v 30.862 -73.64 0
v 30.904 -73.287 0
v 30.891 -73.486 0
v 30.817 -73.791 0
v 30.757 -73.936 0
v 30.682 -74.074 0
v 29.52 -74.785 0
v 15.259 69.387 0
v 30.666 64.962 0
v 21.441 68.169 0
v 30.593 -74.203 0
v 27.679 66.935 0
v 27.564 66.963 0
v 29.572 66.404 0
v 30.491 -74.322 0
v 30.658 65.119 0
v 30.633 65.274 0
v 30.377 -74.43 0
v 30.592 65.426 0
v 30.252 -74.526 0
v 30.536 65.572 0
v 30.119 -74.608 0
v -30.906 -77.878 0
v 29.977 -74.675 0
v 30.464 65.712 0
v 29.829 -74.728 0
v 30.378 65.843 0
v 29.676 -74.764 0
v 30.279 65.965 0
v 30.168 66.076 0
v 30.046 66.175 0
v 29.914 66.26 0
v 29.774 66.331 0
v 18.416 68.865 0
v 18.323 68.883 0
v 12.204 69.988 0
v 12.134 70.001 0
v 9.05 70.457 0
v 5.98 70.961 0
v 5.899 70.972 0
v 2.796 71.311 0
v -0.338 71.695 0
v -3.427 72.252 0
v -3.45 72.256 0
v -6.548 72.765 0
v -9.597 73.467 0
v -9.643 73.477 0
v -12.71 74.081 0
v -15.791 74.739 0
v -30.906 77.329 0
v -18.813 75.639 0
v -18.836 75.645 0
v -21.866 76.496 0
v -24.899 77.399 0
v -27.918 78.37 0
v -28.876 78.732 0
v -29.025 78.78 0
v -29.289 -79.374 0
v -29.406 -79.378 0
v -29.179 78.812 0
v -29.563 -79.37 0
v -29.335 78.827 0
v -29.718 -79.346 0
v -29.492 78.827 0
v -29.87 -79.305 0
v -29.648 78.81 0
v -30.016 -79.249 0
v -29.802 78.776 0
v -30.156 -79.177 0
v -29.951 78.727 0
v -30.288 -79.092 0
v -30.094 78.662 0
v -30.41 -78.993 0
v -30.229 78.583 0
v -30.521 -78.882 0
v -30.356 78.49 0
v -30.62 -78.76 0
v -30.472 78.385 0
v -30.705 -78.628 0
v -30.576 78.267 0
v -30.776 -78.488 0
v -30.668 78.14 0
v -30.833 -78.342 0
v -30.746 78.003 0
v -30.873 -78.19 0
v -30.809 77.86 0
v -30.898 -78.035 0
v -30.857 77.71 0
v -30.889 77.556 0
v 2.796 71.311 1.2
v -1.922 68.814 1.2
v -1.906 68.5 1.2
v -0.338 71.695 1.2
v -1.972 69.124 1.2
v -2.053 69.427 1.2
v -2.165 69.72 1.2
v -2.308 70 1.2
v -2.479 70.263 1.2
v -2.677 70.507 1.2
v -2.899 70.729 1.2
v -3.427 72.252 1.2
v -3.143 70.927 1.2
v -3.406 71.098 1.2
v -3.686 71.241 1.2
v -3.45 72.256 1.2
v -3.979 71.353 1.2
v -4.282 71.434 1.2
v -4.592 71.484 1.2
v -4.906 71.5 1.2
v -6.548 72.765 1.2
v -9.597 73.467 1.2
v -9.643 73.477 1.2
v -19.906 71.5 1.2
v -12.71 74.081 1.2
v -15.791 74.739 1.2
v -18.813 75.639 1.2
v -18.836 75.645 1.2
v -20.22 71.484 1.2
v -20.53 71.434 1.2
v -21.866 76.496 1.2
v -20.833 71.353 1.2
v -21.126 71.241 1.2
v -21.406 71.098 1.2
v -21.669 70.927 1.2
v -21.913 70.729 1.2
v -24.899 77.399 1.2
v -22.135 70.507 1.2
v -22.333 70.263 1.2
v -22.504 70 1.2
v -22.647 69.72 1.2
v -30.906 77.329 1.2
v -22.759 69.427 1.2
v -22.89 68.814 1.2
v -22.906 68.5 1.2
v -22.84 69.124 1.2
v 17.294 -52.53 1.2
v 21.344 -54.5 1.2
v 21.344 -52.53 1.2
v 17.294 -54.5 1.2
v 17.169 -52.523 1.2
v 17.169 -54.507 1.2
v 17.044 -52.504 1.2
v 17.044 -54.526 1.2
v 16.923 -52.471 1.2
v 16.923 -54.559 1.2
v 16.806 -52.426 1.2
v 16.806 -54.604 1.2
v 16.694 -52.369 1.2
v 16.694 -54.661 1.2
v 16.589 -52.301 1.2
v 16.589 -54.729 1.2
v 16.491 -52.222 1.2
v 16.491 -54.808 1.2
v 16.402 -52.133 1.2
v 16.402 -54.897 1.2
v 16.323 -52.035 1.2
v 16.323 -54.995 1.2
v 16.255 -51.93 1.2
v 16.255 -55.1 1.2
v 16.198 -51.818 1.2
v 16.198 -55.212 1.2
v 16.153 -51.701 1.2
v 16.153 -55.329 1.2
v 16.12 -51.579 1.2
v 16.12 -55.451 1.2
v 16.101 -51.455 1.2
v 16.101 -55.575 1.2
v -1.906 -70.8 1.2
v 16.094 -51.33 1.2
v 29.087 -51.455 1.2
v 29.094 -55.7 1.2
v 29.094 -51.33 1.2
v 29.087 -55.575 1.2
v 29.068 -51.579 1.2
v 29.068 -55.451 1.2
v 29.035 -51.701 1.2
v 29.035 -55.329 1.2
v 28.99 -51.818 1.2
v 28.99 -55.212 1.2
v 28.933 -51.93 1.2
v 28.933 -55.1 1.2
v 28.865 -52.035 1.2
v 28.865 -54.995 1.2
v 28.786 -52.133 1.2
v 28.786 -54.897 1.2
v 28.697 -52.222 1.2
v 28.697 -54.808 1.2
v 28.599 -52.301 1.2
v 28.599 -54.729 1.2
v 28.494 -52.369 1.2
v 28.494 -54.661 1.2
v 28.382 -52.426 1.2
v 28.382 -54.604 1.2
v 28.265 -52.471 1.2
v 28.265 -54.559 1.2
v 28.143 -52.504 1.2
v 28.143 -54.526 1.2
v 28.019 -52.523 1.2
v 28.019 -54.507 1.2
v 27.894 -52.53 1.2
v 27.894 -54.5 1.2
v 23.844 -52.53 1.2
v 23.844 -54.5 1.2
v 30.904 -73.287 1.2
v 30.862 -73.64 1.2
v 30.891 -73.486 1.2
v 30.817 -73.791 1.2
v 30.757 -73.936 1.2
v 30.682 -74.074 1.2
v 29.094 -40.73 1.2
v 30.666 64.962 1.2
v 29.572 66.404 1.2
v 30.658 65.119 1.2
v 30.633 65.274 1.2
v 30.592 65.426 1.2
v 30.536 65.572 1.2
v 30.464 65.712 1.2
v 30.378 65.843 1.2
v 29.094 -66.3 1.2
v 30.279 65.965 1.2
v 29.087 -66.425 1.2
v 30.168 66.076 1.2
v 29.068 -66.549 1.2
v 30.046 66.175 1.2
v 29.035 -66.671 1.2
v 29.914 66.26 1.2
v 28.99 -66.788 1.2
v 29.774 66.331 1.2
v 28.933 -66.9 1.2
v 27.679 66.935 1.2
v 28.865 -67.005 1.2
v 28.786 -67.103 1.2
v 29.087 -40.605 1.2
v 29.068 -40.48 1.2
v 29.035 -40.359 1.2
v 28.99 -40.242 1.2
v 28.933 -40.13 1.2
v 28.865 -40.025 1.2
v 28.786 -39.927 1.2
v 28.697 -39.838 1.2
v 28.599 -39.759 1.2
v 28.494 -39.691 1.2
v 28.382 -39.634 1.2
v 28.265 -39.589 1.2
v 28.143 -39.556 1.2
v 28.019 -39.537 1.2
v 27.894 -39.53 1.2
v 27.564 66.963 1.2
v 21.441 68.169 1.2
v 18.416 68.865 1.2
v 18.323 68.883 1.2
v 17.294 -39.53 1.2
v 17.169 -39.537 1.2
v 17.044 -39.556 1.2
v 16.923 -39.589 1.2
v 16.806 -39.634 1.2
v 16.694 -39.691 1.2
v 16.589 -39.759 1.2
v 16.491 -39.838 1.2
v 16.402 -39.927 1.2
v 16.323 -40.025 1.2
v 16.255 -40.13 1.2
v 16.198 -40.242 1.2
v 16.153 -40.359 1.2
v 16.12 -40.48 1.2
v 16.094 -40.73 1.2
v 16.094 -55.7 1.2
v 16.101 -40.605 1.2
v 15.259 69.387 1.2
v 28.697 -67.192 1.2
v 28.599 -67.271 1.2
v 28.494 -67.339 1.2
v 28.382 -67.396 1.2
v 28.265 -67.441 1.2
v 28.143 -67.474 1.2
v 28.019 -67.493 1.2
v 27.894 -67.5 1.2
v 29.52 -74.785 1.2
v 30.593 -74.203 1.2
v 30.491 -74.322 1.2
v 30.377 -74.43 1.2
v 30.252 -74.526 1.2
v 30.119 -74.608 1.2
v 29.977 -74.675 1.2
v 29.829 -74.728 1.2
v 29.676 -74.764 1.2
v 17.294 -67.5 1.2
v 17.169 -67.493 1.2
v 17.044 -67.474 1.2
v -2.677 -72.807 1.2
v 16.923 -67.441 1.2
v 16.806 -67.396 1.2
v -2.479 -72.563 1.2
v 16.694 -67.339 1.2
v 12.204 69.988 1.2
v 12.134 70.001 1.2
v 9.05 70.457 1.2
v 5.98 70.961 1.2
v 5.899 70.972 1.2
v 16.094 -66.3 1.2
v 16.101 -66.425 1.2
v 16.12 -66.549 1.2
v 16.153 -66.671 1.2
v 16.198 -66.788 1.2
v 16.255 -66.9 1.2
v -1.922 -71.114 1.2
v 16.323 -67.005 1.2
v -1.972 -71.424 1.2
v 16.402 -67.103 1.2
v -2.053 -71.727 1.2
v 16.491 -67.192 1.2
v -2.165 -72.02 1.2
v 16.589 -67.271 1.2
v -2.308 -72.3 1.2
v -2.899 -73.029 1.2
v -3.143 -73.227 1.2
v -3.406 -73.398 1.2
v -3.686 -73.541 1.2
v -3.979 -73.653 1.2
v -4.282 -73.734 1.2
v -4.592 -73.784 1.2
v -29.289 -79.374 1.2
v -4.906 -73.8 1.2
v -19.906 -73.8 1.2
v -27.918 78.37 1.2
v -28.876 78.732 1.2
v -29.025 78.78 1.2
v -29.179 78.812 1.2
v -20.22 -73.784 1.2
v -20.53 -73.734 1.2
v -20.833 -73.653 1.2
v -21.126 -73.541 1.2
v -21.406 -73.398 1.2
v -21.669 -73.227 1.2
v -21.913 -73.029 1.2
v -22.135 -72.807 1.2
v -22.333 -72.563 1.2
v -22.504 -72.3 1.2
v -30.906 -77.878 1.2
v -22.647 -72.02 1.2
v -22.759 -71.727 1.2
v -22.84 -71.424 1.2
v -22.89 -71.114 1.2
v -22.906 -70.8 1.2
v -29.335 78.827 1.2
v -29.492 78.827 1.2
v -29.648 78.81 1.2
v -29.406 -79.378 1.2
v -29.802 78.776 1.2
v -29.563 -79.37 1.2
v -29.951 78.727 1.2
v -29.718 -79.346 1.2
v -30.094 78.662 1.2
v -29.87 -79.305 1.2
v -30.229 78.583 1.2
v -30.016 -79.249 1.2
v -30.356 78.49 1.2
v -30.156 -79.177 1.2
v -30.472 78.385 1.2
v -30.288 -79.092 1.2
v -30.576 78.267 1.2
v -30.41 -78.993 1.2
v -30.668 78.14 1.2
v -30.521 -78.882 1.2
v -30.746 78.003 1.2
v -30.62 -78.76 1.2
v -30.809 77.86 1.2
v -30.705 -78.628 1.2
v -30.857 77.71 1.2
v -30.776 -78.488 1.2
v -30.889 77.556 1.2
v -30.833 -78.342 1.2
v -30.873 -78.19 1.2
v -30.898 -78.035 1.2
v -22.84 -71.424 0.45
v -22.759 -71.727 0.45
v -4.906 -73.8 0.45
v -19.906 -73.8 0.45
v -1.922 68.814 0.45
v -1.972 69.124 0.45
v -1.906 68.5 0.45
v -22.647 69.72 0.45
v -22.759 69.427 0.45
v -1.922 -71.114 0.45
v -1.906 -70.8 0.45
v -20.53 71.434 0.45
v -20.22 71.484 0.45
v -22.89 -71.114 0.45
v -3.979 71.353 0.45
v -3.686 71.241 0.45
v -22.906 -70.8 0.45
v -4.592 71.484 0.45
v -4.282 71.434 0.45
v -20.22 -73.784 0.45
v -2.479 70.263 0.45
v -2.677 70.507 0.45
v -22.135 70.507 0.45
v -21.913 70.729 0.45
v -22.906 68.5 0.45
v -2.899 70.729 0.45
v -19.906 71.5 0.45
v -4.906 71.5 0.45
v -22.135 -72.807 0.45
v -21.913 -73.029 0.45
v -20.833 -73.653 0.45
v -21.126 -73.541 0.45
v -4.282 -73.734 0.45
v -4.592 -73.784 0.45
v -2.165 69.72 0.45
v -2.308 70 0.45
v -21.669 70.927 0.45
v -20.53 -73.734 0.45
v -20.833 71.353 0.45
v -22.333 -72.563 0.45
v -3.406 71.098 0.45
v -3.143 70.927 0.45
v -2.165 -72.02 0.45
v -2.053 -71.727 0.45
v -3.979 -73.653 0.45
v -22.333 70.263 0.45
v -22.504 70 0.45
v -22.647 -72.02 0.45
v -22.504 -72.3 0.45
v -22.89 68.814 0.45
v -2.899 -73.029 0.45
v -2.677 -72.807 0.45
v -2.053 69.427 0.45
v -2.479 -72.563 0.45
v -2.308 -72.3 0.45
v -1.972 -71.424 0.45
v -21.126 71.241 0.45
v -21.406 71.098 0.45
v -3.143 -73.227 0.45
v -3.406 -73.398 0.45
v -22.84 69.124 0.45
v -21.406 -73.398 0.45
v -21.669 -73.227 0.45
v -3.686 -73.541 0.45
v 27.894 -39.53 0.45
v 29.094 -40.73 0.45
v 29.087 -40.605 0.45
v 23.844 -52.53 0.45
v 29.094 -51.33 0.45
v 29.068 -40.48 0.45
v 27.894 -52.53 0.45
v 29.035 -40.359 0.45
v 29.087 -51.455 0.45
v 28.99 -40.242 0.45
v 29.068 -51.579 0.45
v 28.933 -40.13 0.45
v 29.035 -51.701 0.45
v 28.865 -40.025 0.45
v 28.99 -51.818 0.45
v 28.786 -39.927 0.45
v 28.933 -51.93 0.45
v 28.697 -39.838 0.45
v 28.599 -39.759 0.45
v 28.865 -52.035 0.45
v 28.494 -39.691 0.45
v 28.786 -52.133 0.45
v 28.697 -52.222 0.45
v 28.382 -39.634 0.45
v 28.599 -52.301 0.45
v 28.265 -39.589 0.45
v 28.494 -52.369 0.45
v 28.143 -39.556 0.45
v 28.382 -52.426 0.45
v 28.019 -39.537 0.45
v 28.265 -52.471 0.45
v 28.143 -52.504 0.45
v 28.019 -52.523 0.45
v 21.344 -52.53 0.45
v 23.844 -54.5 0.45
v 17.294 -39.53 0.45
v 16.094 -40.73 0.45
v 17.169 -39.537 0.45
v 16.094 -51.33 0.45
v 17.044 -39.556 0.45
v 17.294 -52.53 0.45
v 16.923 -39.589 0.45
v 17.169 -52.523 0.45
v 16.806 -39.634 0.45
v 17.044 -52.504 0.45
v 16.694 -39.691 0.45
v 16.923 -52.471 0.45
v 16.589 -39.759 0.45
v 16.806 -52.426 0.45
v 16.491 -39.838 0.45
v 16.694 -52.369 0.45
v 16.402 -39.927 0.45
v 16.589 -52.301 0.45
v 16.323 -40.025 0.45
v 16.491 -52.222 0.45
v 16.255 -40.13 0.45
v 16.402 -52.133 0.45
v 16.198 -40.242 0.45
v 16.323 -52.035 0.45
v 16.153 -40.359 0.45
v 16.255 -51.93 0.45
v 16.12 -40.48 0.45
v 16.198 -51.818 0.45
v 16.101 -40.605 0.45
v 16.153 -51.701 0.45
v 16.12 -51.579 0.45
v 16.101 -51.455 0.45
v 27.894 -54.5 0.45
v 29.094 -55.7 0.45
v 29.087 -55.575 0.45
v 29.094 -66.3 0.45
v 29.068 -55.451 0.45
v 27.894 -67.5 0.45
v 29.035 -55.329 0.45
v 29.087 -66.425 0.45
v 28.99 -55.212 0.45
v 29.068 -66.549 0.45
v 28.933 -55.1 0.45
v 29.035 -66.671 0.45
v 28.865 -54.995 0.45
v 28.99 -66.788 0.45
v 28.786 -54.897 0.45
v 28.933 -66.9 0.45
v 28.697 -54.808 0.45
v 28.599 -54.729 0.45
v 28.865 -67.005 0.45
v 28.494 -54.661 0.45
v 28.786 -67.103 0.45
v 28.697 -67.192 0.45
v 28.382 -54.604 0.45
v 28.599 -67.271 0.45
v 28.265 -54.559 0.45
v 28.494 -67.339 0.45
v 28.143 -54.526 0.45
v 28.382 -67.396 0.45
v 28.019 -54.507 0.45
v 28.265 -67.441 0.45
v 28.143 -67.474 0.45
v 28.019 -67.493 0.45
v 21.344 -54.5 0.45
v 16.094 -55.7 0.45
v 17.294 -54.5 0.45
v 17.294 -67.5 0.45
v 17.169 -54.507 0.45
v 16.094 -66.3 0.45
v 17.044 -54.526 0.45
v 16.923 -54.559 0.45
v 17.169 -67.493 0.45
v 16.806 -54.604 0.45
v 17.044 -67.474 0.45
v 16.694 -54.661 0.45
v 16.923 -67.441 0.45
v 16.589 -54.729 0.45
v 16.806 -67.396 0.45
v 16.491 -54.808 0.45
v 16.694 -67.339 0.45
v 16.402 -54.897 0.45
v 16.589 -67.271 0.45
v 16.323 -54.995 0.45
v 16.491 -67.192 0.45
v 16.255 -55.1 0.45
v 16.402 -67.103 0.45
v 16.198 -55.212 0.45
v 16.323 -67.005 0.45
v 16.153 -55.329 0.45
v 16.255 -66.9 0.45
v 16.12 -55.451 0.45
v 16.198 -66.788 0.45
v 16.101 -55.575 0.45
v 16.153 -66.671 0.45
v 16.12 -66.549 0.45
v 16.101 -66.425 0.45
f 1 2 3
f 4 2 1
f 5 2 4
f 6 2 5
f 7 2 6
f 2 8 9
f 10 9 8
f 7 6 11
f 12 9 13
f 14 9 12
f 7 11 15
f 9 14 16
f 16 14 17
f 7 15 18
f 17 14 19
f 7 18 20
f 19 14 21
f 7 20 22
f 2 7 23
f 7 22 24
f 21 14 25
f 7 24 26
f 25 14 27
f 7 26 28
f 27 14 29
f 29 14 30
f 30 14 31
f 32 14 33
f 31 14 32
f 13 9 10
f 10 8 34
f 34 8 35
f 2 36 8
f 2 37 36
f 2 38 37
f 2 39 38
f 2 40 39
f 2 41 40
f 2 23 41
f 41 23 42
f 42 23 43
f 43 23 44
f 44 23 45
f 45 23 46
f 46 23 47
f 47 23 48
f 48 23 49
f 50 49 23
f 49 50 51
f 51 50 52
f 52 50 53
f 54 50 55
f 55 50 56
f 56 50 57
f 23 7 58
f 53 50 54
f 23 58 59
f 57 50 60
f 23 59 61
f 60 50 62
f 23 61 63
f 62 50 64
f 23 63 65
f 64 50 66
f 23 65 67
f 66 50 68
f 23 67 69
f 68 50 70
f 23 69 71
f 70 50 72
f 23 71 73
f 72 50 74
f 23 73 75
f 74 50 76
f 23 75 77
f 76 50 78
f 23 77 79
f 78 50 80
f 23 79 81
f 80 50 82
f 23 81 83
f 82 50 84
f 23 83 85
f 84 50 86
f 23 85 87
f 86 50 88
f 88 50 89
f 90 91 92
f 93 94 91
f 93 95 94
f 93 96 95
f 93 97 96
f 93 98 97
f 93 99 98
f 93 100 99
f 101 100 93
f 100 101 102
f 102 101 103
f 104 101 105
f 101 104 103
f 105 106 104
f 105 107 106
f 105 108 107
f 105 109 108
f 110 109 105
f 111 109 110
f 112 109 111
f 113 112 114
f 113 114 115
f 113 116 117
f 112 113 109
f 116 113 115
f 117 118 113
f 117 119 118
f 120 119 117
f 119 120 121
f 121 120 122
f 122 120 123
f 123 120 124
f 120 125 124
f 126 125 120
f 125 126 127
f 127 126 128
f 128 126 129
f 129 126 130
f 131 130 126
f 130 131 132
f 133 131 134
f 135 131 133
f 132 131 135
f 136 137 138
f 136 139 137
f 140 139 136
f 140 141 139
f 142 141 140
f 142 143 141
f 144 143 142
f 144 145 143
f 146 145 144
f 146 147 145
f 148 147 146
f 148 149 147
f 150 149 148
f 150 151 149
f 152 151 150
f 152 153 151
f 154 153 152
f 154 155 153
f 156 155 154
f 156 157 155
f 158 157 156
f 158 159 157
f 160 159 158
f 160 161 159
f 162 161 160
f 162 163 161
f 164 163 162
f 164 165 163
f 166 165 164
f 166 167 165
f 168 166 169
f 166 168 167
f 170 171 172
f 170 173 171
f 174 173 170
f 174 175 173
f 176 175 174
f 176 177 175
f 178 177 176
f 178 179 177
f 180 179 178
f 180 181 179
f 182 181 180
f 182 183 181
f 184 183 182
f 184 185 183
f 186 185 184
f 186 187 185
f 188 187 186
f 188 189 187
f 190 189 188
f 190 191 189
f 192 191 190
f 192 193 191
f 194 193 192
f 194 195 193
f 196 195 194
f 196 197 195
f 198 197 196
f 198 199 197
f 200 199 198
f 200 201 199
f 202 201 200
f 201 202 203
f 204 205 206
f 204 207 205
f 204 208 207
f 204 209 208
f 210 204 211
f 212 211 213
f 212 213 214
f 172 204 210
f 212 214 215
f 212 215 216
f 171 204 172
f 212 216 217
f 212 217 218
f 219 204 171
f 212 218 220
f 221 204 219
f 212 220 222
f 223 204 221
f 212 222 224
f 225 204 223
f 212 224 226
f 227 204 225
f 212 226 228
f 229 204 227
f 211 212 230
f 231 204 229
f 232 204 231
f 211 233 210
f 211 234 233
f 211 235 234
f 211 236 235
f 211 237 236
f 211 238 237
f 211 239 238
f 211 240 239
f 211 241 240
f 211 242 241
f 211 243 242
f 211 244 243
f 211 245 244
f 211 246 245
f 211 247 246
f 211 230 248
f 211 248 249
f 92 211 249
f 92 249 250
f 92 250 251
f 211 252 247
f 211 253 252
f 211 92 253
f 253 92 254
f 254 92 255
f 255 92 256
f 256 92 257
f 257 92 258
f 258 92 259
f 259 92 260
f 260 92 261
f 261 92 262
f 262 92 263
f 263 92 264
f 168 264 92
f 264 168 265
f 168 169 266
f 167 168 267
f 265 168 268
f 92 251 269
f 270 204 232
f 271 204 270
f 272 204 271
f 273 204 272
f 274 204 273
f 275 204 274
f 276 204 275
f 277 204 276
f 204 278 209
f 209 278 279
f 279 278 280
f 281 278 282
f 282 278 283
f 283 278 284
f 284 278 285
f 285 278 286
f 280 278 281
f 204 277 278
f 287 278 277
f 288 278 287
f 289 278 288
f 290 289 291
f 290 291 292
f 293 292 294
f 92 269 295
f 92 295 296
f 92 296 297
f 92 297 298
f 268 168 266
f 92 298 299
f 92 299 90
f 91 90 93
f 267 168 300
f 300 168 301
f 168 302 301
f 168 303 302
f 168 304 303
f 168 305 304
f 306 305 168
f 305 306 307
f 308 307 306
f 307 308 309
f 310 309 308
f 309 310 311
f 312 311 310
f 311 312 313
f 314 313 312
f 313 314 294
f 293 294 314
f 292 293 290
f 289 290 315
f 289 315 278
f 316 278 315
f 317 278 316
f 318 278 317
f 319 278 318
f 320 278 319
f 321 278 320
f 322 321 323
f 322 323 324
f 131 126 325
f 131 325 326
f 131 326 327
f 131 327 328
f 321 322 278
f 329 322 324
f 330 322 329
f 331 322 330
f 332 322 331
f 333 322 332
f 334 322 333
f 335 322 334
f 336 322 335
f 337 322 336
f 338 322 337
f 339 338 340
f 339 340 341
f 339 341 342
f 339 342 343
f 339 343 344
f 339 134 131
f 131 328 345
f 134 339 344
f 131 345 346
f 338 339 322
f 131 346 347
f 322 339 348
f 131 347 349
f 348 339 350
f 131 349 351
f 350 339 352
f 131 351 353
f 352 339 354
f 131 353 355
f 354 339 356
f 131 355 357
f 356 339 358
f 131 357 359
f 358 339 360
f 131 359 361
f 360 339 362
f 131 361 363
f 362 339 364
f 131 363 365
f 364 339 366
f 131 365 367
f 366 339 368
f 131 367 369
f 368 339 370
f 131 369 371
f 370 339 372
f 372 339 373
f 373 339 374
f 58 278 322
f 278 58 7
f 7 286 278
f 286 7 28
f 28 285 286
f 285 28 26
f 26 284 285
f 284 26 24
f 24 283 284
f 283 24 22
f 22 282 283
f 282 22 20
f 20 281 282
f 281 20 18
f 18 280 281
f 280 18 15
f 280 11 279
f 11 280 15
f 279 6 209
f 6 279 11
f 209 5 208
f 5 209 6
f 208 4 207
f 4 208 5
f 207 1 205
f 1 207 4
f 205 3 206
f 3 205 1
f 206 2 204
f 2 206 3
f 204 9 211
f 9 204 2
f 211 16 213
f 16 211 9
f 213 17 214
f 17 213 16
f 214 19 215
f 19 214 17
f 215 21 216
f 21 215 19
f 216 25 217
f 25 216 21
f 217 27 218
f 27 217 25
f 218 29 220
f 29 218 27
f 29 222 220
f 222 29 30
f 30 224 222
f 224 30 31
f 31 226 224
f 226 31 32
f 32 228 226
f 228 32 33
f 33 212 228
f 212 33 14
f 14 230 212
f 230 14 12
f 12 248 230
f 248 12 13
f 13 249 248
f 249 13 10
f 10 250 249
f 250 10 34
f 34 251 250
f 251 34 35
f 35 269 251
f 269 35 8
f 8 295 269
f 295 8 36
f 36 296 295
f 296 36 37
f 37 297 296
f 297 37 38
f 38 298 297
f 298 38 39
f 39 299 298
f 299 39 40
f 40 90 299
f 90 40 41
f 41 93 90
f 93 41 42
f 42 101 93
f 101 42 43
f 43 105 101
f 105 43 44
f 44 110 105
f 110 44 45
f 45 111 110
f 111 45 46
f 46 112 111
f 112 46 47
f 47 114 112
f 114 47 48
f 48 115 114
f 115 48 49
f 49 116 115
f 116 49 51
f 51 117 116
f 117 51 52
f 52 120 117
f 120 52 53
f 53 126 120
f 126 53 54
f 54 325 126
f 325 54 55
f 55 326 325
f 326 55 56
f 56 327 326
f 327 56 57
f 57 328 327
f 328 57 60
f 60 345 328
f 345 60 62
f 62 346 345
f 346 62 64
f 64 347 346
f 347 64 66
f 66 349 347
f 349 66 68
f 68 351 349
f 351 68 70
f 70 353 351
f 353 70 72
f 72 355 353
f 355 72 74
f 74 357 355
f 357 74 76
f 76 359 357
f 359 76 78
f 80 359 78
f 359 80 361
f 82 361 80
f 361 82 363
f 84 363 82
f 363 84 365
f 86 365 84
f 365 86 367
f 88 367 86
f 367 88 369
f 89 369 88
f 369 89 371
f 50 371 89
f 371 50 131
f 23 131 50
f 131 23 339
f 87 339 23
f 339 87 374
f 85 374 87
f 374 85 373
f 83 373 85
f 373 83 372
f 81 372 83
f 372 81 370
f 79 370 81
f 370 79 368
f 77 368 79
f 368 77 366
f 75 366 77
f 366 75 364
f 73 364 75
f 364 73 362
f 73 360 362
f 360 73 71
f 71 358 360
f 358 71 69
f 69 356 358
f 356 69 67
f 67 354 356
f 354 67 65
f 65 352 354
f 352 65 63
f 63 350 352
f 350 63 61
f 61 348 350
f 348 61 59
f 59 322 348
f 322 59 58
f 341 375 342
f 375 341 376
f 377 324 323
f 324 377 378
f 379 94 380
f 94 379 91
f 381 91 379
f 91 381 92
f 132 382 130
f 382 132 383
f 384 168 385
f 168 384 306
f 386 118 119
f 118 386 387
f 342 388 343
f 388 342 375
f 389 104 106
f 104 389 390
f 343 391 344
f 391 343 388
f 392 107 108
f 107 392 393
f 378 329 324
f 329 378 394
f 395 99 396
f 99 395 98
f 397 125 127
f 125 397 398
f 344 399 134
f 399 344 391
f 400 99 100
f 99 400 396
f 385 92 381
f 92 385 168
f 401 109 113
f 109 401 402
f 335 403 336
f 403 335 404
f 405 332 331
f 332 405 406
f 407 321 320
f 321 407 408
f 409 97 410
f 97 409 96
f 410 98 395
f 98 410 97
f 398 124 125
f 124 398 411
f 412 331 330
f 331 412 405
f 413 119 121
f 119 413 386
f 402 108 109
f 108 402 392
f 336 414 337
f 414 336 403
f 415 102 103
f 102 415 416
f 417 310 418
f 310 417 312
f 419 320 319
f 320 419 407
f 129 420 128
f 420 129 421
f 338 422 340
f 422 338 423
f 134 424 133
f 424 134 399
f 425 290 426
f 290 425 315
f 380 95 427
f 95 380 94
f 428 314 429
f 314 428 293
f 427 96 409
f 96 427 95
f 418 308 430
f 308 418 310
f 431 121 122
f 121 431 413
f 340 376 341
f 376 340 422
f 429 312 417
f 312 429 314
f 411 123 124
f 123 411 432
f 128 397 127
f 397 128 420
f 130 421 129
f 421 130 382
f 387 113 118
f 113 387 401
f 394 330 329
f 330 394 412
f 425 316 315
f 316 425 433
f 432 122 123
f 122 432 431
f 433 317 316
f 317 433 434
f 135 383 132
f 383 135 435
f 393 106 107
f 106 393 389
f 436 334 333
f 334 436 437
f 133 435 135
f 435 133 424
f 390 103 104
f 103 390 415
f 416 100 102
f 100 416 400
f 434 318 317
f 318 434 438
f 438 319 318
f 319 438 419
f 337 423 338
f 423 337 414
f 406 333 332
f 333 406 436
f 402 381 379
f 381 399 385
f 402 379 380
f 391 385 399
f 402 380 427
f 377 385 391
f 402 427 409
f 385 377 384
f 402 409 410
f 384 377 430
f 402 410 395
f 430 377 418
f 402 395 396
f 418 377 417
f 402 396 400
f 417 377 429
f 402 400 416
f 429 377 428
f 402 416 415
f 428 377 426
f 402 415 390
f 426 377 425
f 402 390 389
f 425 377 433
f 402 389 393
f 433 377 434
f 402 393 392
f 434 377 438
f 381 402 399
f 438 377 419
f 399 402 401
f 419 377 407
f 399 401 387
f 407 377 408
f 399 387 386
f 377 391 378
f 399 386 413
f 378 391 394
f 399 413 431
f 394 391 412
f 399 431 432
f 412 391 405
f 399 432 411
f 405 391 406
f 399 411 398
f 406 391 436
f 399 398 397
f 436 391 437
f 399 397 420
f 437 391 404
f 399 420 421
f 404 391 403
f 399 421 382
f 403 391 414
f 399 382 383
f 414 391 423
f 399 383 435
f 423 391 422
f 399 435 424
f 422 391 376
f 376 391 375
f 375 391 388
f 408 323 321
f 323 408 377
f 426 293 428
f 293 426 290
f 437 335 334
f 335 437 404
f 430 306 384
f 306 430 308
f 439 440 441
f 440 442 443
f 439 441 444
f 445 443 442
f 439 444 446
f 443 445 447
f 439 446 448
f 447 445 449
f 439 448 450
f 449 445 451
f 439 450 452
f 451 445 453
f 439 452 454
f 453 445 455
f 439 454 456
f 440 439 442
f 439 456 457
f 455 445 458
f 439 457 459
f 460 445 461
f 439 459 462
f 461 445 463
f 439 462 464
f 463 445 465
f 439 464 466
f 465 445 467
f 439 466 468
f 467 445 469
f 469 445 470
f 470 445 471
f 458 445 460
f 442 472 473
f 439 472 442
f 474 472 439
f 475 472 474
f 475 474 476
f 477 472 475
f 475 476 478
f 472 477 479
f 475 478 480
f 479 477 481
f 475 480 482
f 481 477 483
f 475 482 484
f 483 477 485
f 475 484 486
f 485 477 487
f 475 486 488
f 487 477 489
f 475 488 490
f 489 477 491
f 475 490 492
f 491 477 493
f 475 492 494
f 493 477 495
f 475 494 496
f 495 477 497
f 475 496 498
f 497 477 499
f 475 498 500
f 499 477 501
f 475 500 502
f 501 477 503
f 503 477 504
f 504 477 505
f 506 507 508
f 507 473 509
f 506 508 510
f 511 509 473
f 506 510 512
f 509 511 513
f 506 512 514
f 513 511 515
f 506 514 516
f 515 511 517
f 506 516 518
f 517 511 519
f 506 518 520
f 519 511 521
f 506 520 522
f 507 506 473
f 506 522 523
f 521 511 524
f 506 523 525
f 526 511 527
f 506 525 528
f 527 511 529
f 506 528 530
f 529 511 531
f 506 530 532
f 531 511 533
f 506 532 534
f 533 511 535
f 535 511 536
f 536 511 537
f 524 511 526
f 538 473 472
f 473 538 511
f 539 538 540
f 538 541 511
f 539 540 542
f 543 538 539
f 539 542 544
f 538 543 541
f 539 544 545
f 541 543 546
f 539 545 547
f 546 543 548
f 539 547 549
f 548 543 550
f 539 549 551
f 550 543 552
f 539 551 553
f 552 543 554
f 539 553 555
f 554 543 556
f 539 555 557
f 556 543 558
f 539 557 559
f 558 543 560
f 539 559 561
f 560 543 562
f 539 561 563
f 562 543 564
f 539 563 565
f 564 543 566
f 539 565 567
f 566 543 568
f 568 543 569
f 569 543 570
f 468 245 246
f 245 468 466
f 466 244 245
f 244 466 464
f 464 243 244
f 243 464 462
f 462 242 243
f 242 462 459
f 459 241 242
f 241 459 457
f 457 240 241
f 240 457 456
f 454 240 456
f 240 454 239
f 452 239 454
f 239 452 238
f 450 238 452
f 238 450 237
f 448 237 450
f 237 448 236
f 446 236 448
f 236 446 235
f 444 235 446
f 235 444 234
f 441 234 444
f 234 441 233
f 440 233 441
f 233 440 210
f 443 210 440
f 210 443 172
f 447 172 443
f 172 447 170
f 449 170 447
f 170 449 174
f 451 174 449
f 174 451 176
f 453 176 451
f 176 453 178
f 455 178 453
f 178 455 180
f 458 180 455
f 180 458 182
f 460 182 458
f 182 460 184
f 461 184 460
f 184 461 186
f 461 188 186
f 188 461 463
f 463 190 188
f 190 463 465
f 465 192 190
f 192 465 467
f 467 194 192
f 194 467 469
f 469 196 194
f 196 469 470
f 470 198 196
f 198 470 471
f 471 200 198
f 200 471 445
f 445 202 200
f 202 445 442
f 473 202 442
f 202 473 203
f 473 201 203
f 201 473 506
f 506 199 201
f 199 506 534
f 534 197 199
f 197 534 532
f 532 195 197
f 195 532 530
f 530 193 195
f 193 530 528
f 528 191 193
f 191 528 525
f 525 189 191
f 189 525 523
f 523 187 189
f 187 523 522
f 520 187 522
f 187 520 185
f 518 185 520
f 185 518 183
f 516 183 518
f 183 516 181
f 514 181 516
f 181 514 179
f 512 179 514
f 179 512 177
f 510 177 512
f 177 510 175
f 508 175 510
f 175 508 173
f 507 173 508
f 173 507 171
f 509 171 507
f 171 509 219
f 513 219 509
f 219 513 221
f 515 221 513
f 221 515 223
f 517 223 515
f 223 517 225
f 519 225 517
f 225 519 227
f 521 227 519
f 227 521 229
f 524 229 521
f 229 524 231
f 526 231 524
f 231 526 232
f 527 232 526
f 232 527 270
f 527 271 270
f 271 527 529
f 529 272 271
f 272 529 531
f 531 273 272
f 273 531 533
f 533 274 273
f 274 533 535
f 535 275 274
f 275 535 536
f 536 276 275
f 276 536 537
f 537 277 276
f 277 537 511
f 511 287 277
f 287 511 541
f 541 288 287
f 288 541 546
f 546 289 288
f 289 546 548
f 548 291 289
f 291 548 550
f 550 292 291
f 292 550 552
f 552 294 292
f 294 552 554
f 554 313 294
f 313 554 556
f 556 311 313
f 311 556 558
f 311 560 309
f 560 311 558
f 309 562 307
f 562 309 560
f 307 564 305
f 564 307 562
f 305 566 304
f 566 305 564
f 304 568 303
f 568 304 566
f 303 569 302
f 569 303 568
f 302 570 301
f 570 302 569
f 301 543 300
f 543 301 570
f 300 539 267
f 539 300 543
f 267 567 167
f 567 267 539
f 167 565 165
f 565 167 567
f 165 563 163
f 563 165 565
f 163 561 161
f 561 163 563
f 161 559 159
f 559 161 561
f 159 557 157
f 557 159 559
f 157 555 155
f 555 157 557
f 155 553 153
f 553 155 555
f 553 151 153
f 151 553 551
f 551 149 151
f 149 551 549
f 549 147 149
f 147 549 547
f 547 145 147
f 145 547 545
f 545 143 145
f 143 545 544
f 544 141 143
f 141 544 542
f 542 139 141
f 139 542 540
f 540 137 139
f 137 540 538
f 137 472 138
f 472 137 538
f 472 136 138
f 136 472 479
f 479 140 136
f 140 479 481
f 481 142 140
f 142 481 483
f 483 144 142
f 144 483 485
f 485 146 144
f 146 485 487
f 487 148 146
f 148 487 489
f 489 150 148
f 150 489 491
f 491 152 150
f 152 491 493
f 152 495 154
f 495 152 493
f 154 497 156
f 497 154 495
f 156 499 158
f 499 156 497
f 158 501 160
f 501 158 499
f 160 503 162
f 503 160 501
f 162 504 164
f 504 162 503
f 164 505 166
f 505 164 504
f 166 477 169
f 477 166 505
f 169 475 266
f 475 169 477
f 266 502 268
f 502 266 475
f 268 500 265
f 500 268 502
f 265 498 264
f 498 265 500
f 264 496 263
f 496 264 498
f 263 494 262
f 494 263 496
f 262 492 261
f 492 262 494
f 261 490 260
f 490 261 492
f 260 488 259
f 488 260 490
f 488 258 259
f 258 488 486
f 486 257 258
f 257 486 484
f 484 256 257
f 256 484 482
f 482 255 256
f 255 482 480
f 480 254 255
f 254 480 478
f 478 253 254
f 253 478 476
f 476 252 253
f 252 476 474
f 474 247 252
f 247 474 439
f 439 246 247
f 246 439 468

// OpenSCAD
// ============================================================
// Omnichord OM-27 Strumplate Top Plate
// ============================================================
// A cover plate that sits over the flex PCB strum strip.
// Two features create the gap needed between the flex PCB
// contacts and the conductive strumming surface:
//
//   1. MAIN VALLEY  -> a shallow recess: a slim rectangle with small
//      rounded corners at the short ends (NOT a fat pill/stadium),
//      running nearly the FULL length of the plate, independent of
//      where the pad cluster sits, cut to recess_depth.
//   2. PAD RECESS   -> a shallow pocket (same recess_depth) over the
//      small contact pad near the top, connected to a second
//      smaller pocket by a thin bridge slot (matches the two
//      cutouts + connecting tab seen in the reference CAD model).
//
// Both recesses are cut from the TOP face only, leaving a thin,
// paper-thin BOTTOM skin (bottom_skin_thickness) untouched -- that
// skin is the side the user's finger touches, and should be printed
// face-down on the bed as the first layer for max smoothness.
//
// Adjust the PARAMETERS block below to match your real
// measurements -- nothing else needs to change.
// ============================================================

/* [Overall plate -- asymmetric trapezoid with a curved top edge] */
// The two LONG edges (left & right) are PARALLEL to each other and are
// the sides the long valley recess runs alongside. The two SHORT edges
// (top & bottom) connect them and are NOT parallel to each other.
// The TOP short edge (opposite the pad cluster, which is mirrored to
// sit near the bottom in the 3D assembly below) is not straight.
edge_left_long   = 159;  // length of the long left edge, mm
edge_right_long  = 142;  // length of the long right edge, mm
edge_top_short   = 63;   // length of the short top edge, mm (straight-line/chord distance
                          // between TL and TR -- the curve deviates from this)
edge_bottom_short = 62;  // length of the short bottom edge, mm (straight)
corner_radius     = 1.5; // small rounding at all four corners (just enough to not be knife-sharp)

// --- Top edge curve: direct, editable point list ---
// Each entry is [t, dev]:
//   t   = position along the TL->TR chord, 0 = TL, 1 = TR
//   dev = perpendicular deviation from the straight chord, in mm
//         (POSITIVE = bulges OUT away from the plate body, NEGATIVE = dips IN)
// The curve is built by linearly interpolating between these points in
// order, so each point's effect is LOCAL -- nudge one [t, dev] pair and
// only the curve segments touching it move, unlike a Bezier where every
// control point affects the whole shape. Add more points for finer
// control anywhere you need it; t doesn't need to be evenly spaced.
// The first point should be [0, 0] (note: this curve doesn't return to
// 0 at t=1 -- it settles at -0.75, which is fine, just means TR sits
// slightly inset from the literal corner; t=1 is still anchored to TR
// in the construction below regardless of the dev value there).
// These points follow your last set (the ones that got close), just
// resampled to a finer 0.05 step using smooth monotone interpolation
// (PCHIP -- passes through your original points exactly, no
// overshoot/ringing introduced in between) so you have more individual
// handles to nudge.
TOP_CURVE_PTS = [
    [0.00, 0.0],
    [0.05, -0.531],
    [0.10, -0.9],
    [0.15, -1.2],
    [0.20, -1.45],
    [0.25, -1.75],
    [0.30, -1.8],
    [0.35, -1.8],
    [0.40, -1.9],
    [0.45, -1.8],
    [0.50, -1.75],
    [0.55, -1.521],
    [0.60, -1.25],
    [0.65, -1.15],
    [0.70, -1],
    [0.75, -1],
    [0.80, -0.9],
    [0.85, -1],
    [0.90, -1],
    [0.95, -1],
    [1.00, -1.25],
];
top_curve_resolution = 6; // segments to interpolate BETWEEN each pair of points
                          // (higher = smoother straight-line approximation of
                          // whatever shape you build with the points above;
                          // since interpolation is linear, this mostly just
                          // affects corner_radius rounding smoothness, not
                          // the underlying shape)

// --- Derived corner geometry (do not edit) ---
// Solve for the perpendicular distance `plate_w` between the two parallel
// long edges, and the vertical stagger `edge_offset` of the right edge
// relative to the left edge, such that the connecting short edges come
// out to edge_top_short / edge_bottom_short exactly (using the straight-
// line/chord length for the top edge, since the S-curve is added after).
// System (derived once and baked in as a closed-form solution):
//   bottom_short^2 = plate_w^2 + edge_offset^2
//   top_short^2    = plate_w^2 + (edge_left_long - (edge_offset + edge_right_long))^2
// Subtracting and solving for edge_offset:
_k = edge_left_long - edge_right_long;
edge_offset = ( (edge_bottom_short*edge_bottom_short) - (edge_top_short*edge_top_short) + (_k*_k) ) / (2*_k);
plate_w = sqrt(edge_bottom_short*edge_bottom_short - edge_offset*edge_offset);

// Corner coordinates (left edge along x=0, right edge along x=plate_w),
// then re-centered so x=0 sits on the long-axis centerline and y=0 sits
// at the vertical midpoint of the left edge, for convenient downstream use.
_BL = [0, 0];
_TL = [0, edge_left_long];
_BR = [plate_w, edge_offset];
_TR = [plate_w, edge_offset + edge_right_long];
_cx = plate_w/2;
_cy = edge_left_long/2;
BL = _BL - [_cx, _cy];
TL = _TL - [_cx, _cy];
BR = _BR - [_cx, _cy];
TR = _TR - [_cx, _cy];

// plate_length kept for backward compatibility with valley/pad placement
// below -- approximate overall span used for "distance from top" offsets.
plate_length = max(TL.y, TR.y) - min(BL.y, BR.y);

// The plate is built from two thicknesses stacked:
//   bottom_skin_thickness -> the touch surface (prints FIRST, face-down on the bed).
//                            Keep this paper-thin (1-2 perimeter layers, e.g. 0.2-0.4mm
//                            at a 0.2mm layer height) so finger contact can reach through
//                            wherever the recess above it is cut.
//   recess_depth           -> how deep the valley/pad recesses cut into the TOP face.
// plate_thickness is just their sum -- change the two thickness values, not this one.
bottom_skin_thickness = 0.45;   // <-- paper-thin touch surface, tune to your layer height
recess_depth          = 0.75;   // depth of the valley + pad recesses, cut from the top
plate_thickness        = bottom_skin_thickness + recess_depth;

/* [Main valley - shallow recess, sized to the OM-84 flex PCB contact row] */
// Measured from the OM-84 strumplate_traces.svg: 13 contacts, pitch
// 11.275mm center-to-center, each contact finger 13.698mm long (the
// across-strip dimension) x 4.421mm wide (the along-strip dimension).
contact_pitch       = 11.275; // mm, center-to-center spacing along the strip
contact_count       = 13;     // number of contacts in the row
valley_width      = 21;   // matches the OM-84 contact finger length (across-strip)
valley_length     = contact_pitch * (contact_count - 1) + 10; // total span of the row, ~139.7mm
valley_margin_top    = 8;  // gap kept between the top-left corner and the start of the valley
                             // (only used to help VERTICALLY CENTER the now fixed-length valley;
                             // see valley_2d() below)
valley_inset      = valley_width/2+8;    // how far in from the LEFT edge the recess sits, mm
valley_end_radius = 3;    // corner rounding radius at the two short ends (small radius,
                           // NOT half the width -- gives slim rounded-rect ends like the
                           // metallic strip in the reference photo, not a full pill cap)

/* [Pad recess cluster - sized to the OM-84 flex PCB pad contacts] */
// Measured from the same SVG: pad pitch 14.97mm center-to-center.
pad_contact_pitch = 14.97;  // mm, center-to-center spacing between the two pads
pad1_w = 13; pad1_h = 13;   // upper pad rectangle (rounded)
pad2_w = 13; pad2_h = 13;   // lower pad rectangle (rounded)
pad_corner_r       = 1.2;   // corner rounding for the pad rectangles
pad_gap            = pad_contact_pitch - pad1_h/2 - pad2_h/2; // vertical gap between pad1/pad2, derived from pitch
tab_width          = 2.5;   // width of the connecting bridge slot between pad1/pad2
min_wall_to_valley = 4;     // (unused now that spacing is set directly by distance below;
                             // kept only for reference/back-compat)
pad_to_valley_center_dist = 35; // distance between pad-cluster center and valley center, mm

// Final layout: the VALLEY sits on the NEGATIVE X side (toward the
// left edge) and stays exactly where it was. The PAD CLUSTER's center
// is placed exactly pad_to_valley_center_dist (35mm) away from the
// valley's center, along X.
pad_cluster_half_w = max(pad1_w, pad2_w) / 2;
valley_x_center = BL.x + valley_inset;
pad_offset_x = valley_x_center + pad_to_valley_center_dist;
pad_offset_y_top = TL.y - 25 + 13;   // y position where pad1 (upper) starts, measured down from top-left corner

/* [Rendering] */
$fn = 60;

// ============================================================
// 2D PROFILES
// ============================================================

// Asymmetric trapezoid plate outline: long left edge and long right
// edge are parallel; short bottom edge is straight; short TOP edge
// follows TOP_CURVE_PTS (see PARAMETERS above), projected onto the
// real TL-TR chord and linearly interpolated point-to-point, built
// from the solved corner points BL/TL/BR/TR, with small corner
// rounding applied at the end.
module plate_solid_2d() {
    chord = TR - TL;
    chord_len = norm(chord);
    u = chord / chord_len;
    perp = [u.y, -u.x];
    plate_center_dir = ((BL + BR) / 2) - (TL + TR) / 2;
    // outward_dir points AWAY from the plate body (so + dev bulges out)
    outward_dir = (perp.x*plate_center_dir.x + perp.y*plate_center_dir.y > 0) ? -perp : perp;

    // project each [t, dev] point onto the real chord
    anchor_pts = [
        for (pair = TOP_CURVE_PTS)
            TL + pair[0]*chord + outward_dir*pair[1]
    ];

    // linearly interpolate top_curve_resolution extra points between each
    // consecutive pair of anchors, so corner_radius rounding (which acts
    // on every vertex) has more, closer-together points to round smoothly
    // rather than just the handful of anchors themselves
    n_anchors = len(anchor_pts);
    top_curve_TL_to_TR = [
        for (seg = [0 : n_anchors - 2])
            for (k = [0 : top_curve_resolution - 1])
                let(
                    a = anchor_pts[seg],
                    b = anchor_pts[seg + 1],
                    f = k / top_curve_resolution
                )
                a + (b - a) * f
    ];
    top_curve_TL_to_TR_full = concat(top_curve_TL_to_TR, [anchor_pts[n_anchors - 1]]);
    top_curve_pts = [for (i = [len(top_curve_TL_to_TR_full)-1:-1:0]) top_curve_TL_to_TR_full[i]]; // TR -> ... -> TL

    offset(r = corner_radius)
        offset(delta = -corner_radius)
            polygon(points = concat([BL, BR], top_curve_pts));
}

// Single rounded rectangle helper (centered)
module rounded_rect(w, h, r) {
    hull() {
        translate([ w/2 - r,  h/2 - r]) circle(r = r);
        translate([-w/2 + r,  h/2 - r]) circle(r = r);
        translate([ w/2 - r, -h/2 + r]) circle(r = r);
        translate([-w/2 + r, -h/2 + r]) circle(r = r);
    }
}

// Main valley: long slim rectangle with small rounded corners at the
// short ends, sized to exactly span the OM-84 contact row (fixed
// valley_length, see PARAMETERS), inset in from the left edge.
module valley_2d() {
    y_top = TL.y - valley_margin_top;
    y_center = y_top - valley_length/2;

    translate([valley_x_center, y_center])
        rounded_rect(valley_width, valley_length, valley_end_radius);
}

// Pad recess cluster: pad1 (upper) + pad2 (lower) + connecting bridge tab
module pad_cluster_2d() {
    pad1_cy = pad_offset_y_top - pad1_h/2;
    pad2_cy = pad1_cy - pad1_h/2 - pad_gap - pad2_h/2;

    union() {
        translate([pad_offset_x, pad1_cy])
            rounded_rect(pad1_w, pad1_h, pad_corner_r);

        translate([pad_offset_x, pad2_cy])
            rounded_rect(pad2_w, pad2_h, pad_corner_r);

        // connecting bridge between the two pads
        translate([pad_offset_x, (pad1_cy + pad2_cy)/2])
            square([tab_width, pad1_h/2 + pad_gap + pad2_h/2], center = true);
    }
}

// ============================================================
// 3D ASSEMBLY
// ============================================================
// Orientation: z=0 is the BOTTOM touch surface (this should be
// the face that sits on the print bed, i.e. print this part
// face-down / recesses-up so the smooth first layer becomes the
// finger-touch side). z = plate_thickness is the TOP face where
// both recesses are cut in.

module strumplate() {
    difference() {
        // base plate
        linear_extrude(height = plate_thickness)
            plate_solid_2d();

        // 1) main valley -- shallow recess cut from the TOP face only,
        //    leaving bottom_skin_thickness of solid material below it
        translate([0, 0, bottom_skin_thickness])
            linear_extrude(height = recess_depth + 0.5)
                valley_2d();

        // 2) pad recess -- shallow pocket cut from the TOP face only,
        //    same depth, same remaining bottom skin
        translate([0, 0, bottom_skin_thickness])
        mirror([0,1,0])
            linear_extrude(height = recess_depth + 0.5)
                pad_cluster_2d();
    }
}

strumplate();

// ------------------------------------------------------------
// Uncomment to sanity-check the 2D layout from directly above
// before committing to the 3D print:
// projection(cut = false) strumplate();
